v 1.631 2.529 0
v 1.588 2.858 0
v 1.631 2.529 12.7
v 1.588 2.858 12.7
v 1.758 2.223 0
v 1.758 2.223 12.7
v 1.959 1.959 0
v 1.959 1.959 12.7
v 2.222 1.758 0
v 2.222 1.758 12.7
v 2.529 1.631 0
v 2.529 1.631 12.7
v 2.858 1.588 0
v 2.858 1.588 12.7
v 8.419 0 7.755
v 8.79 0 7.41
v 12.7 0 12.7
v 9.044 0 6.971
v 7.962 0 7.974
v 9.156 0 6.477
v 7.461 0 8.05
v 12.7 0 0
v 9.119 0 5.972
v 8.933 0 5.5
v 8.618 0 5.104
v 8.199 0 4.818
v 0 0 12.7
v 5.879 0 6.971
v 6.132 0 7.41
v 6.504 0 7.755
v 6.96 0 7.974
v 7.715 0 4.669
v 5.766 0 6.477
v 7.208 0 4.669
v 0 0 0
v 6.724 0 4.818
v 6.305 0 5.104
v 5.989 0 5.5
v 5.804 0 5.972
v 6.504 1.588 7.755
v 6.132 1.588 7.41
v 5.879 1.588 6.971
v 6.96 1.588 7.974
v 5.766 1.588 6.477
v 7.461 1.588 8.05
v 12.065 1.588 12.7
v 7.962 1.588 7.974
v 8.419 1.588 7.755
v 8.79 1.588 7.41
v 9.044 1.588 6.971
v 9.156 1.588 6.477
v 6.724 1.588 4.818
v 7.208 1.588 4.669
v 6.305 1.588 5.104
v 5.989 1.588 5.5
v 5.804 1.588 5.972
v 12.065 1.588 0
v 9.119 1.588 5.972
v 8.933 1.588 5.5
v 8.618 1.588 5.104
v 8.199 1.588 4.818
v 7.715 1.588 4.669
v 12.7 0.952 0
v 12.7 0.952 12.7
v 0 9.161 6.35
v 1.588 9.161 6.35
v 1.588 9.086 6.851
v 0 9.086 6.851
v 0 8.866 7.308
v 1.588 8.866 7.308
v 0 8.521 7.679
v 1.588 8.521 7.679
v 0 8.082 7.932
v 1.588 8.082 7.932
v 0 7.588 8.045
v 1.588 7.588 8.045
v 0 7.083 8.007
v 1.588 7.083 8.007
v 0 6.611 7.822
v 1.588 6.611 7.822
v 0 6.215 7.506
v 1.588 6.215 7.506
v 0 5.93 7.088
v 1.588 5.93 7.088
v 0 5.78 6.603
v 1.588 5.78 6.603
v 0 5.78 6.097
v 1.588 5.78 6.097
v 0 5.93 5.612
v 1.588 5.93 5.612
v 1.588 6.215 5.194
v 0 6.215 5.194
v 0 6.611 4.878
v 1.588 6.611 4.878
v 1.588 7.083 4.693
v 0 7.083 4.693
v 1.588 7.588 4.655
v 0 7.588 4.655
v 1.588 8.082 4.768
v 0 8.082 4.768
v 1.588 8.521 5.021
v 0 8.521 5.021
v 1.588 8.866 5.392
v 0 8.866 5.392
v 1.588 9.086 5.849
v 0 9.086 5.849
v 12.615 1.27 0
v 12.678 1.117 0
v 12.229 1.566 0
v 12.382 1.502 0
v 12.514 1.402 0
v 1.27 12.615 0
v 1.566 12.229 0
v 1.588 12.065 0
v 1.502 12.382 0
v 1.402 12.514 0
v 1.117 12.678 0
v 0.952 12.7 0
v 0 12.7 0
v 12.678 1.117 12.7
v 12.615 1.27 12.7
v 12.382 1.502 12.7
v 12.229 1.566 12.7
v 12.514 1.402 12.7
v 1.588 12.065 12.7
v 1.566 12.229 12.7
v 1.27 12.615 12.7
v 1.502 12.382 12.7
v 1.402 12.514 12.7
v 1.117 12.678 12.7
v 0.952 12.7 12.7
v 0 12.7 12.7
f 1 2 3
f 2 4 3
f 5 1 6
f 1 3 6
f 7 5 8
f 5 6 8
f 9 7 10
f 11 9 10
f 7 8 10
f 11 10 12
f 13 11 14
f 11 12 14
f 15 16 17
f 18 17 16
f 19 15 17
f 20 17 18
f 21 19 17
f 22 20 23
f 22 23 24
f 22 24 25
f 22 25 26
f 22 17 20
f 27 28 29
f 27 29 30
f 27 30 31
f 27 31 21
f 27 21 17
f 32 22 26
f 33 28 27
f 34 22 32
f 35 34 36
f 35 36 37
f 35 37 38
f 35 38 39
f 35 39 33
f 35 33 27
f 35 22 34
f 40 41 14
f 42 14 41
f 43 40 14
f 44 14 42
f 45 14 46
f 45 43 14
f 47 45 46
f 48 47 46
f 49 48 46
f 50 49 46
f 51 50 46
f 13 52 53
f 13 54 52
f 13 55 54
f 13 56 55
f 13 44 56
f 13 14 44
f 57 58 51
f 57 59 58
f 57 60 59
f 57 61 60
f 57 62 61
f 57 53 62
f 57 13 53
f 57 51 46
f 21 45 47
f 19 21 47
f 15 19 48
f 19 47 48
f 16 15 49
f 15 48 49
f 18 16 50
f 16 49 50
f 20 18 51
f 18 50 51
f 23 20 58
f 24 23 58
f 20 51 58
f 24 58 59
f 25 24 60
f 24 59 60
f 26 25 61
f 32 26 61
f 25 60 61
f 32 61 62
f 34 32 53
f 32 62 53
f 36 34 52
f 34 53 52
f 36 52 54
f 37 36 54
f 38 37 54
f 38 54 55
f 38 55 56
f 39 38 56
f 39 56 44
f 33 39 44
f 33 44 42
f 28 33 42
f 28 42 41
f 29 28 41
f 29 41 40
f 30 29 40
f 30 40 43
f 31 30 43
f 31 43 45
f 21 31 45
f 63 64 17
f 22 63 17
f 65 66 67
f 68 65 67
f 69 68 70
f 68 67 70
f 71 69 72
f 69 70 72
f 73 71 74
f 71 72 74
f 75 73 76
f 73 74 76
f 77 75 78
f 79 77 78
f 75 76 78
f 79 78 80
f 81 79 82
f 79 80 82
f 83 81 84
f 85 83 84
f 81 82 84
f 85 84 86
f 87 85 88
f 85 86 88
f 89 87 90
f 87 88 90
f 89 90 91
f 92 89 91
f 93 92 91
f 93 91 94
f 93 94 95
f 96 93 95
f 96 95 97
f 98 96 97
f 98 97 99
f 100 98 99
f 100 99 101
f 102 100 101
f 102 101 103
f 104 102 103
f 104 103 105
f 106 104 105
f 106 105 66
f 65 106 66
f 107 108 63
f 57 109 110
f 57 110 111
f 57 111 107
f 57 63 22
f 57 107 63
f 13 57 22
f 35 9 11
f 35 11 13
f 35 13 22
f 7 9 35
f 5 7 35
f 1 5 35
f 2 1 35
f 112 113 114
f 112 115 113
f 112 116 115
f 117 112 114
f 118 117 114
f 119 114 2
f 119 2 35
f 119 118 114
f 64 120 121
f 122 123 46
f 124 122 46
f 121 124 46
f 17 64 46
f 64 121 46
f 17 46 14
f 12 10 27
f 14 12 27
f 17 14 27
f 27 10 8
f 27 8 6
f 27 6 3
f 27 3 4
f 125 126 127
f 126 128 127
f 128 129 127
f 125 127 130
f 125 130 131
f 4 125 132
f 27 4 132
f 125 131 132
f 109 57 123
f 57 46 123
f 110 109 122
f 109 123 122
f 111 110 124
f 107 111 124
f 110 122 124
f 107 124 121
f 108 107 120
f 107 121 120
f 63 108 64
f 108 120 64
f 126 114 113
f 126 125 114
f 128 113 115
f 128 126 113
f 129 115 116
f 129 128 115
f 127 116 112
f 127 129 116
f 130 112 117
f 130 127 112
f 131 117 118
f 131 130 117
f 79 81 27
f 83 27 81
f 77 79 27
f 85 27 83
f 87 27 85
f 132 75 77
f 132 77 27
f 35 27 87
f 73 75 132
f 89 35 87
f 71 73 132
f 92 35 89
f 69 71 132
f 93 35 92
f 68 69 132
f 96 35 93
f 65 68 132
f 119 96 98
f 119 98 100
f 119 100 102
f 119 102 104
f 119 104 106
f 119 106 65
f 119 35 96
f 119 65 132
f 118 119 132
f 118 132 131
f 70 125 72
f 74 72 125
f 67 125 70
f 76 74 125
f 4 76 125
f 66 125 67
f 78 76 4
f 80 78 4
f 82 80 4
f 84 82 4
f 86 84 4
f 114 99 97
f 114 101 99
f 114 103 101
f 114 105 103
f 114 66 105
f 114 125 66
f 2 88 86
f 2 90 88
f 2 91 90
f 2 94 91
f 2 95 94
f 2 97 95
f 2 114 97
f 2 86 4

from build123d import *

# Parameters (mm, degrees)
BOSS_EXTRUDE1_DEPTH = 12.7
FILLET1_R           = 1.27
FILLET2_R           = 0.635
SKETCH2_R           = 1.7
CUT_EXTRUDE1_DEPTH  = 22.120313829
SKETCH3_R           = 1.7
CUT_EXTRUDE2_DEPTH  = 22.120313829


with BuildPart() as part:
    # Sketch1 → Boss-Extrude1 (new body)
    with BuildSketch(Plane.XY):
        Polygon((0, 0), (0, 12.7), (1.5875, 12.7), (1.5875, 1.5875), (12.7, 1.5875), (12.7, 0), align=None)
    extrude(amount=BOSS_EXTRUDE1_DEPTH)

    # Fillet1
    fillet1_edges = [part.edges().sort_by_distance(p)[0] for p in [
        (1.5875, 1.5875, 6.35),
    ]]
    fillet(fillet1_edges, radius=FILLET1_R)

    # Fillet2
    fillet2_edges = [part.edges().sort_by_distance(p)[0] for p in [
        (1.5875, 12.7, 6.35),
        (12.7, 1.5875, 6.35),
    ]]
    fillet(fillet2_edges, radius=FILLET2_R)

    # Sketch2 → Cut-Extrude1 (cut, through all)
    with BuildSketch(Plane(origin=(1.5875, 0, 0), x_dir=(0, 0, -1), z_dir=(1, 0, 0))):
        with Locations(Location((-6.35, 7.46125, 0), (0, 0, 90))):
            Circle(SKETCH2_R)
    extrude(amount=-CUT_EXTRUDE1_DEPTH, mode=Mode.SUBTRACT)

    # Sketch3 → Cut-Extrude2 (cut, through all)
    with BuildSketch(Plane(origin=(0, 1.5875, 0), x_dir=(1, 0, 0), z_dir=(0, 1, 0))):
        with Locations(Location((7.46125, -6.35, 0), (0, 0, 270))):
            Circle(SKETCH3_R)
    extrude(amount=-CUT_EXTRUDE2_DEPTH, mode=Mode.SUBTRACT)


solid = part.part
